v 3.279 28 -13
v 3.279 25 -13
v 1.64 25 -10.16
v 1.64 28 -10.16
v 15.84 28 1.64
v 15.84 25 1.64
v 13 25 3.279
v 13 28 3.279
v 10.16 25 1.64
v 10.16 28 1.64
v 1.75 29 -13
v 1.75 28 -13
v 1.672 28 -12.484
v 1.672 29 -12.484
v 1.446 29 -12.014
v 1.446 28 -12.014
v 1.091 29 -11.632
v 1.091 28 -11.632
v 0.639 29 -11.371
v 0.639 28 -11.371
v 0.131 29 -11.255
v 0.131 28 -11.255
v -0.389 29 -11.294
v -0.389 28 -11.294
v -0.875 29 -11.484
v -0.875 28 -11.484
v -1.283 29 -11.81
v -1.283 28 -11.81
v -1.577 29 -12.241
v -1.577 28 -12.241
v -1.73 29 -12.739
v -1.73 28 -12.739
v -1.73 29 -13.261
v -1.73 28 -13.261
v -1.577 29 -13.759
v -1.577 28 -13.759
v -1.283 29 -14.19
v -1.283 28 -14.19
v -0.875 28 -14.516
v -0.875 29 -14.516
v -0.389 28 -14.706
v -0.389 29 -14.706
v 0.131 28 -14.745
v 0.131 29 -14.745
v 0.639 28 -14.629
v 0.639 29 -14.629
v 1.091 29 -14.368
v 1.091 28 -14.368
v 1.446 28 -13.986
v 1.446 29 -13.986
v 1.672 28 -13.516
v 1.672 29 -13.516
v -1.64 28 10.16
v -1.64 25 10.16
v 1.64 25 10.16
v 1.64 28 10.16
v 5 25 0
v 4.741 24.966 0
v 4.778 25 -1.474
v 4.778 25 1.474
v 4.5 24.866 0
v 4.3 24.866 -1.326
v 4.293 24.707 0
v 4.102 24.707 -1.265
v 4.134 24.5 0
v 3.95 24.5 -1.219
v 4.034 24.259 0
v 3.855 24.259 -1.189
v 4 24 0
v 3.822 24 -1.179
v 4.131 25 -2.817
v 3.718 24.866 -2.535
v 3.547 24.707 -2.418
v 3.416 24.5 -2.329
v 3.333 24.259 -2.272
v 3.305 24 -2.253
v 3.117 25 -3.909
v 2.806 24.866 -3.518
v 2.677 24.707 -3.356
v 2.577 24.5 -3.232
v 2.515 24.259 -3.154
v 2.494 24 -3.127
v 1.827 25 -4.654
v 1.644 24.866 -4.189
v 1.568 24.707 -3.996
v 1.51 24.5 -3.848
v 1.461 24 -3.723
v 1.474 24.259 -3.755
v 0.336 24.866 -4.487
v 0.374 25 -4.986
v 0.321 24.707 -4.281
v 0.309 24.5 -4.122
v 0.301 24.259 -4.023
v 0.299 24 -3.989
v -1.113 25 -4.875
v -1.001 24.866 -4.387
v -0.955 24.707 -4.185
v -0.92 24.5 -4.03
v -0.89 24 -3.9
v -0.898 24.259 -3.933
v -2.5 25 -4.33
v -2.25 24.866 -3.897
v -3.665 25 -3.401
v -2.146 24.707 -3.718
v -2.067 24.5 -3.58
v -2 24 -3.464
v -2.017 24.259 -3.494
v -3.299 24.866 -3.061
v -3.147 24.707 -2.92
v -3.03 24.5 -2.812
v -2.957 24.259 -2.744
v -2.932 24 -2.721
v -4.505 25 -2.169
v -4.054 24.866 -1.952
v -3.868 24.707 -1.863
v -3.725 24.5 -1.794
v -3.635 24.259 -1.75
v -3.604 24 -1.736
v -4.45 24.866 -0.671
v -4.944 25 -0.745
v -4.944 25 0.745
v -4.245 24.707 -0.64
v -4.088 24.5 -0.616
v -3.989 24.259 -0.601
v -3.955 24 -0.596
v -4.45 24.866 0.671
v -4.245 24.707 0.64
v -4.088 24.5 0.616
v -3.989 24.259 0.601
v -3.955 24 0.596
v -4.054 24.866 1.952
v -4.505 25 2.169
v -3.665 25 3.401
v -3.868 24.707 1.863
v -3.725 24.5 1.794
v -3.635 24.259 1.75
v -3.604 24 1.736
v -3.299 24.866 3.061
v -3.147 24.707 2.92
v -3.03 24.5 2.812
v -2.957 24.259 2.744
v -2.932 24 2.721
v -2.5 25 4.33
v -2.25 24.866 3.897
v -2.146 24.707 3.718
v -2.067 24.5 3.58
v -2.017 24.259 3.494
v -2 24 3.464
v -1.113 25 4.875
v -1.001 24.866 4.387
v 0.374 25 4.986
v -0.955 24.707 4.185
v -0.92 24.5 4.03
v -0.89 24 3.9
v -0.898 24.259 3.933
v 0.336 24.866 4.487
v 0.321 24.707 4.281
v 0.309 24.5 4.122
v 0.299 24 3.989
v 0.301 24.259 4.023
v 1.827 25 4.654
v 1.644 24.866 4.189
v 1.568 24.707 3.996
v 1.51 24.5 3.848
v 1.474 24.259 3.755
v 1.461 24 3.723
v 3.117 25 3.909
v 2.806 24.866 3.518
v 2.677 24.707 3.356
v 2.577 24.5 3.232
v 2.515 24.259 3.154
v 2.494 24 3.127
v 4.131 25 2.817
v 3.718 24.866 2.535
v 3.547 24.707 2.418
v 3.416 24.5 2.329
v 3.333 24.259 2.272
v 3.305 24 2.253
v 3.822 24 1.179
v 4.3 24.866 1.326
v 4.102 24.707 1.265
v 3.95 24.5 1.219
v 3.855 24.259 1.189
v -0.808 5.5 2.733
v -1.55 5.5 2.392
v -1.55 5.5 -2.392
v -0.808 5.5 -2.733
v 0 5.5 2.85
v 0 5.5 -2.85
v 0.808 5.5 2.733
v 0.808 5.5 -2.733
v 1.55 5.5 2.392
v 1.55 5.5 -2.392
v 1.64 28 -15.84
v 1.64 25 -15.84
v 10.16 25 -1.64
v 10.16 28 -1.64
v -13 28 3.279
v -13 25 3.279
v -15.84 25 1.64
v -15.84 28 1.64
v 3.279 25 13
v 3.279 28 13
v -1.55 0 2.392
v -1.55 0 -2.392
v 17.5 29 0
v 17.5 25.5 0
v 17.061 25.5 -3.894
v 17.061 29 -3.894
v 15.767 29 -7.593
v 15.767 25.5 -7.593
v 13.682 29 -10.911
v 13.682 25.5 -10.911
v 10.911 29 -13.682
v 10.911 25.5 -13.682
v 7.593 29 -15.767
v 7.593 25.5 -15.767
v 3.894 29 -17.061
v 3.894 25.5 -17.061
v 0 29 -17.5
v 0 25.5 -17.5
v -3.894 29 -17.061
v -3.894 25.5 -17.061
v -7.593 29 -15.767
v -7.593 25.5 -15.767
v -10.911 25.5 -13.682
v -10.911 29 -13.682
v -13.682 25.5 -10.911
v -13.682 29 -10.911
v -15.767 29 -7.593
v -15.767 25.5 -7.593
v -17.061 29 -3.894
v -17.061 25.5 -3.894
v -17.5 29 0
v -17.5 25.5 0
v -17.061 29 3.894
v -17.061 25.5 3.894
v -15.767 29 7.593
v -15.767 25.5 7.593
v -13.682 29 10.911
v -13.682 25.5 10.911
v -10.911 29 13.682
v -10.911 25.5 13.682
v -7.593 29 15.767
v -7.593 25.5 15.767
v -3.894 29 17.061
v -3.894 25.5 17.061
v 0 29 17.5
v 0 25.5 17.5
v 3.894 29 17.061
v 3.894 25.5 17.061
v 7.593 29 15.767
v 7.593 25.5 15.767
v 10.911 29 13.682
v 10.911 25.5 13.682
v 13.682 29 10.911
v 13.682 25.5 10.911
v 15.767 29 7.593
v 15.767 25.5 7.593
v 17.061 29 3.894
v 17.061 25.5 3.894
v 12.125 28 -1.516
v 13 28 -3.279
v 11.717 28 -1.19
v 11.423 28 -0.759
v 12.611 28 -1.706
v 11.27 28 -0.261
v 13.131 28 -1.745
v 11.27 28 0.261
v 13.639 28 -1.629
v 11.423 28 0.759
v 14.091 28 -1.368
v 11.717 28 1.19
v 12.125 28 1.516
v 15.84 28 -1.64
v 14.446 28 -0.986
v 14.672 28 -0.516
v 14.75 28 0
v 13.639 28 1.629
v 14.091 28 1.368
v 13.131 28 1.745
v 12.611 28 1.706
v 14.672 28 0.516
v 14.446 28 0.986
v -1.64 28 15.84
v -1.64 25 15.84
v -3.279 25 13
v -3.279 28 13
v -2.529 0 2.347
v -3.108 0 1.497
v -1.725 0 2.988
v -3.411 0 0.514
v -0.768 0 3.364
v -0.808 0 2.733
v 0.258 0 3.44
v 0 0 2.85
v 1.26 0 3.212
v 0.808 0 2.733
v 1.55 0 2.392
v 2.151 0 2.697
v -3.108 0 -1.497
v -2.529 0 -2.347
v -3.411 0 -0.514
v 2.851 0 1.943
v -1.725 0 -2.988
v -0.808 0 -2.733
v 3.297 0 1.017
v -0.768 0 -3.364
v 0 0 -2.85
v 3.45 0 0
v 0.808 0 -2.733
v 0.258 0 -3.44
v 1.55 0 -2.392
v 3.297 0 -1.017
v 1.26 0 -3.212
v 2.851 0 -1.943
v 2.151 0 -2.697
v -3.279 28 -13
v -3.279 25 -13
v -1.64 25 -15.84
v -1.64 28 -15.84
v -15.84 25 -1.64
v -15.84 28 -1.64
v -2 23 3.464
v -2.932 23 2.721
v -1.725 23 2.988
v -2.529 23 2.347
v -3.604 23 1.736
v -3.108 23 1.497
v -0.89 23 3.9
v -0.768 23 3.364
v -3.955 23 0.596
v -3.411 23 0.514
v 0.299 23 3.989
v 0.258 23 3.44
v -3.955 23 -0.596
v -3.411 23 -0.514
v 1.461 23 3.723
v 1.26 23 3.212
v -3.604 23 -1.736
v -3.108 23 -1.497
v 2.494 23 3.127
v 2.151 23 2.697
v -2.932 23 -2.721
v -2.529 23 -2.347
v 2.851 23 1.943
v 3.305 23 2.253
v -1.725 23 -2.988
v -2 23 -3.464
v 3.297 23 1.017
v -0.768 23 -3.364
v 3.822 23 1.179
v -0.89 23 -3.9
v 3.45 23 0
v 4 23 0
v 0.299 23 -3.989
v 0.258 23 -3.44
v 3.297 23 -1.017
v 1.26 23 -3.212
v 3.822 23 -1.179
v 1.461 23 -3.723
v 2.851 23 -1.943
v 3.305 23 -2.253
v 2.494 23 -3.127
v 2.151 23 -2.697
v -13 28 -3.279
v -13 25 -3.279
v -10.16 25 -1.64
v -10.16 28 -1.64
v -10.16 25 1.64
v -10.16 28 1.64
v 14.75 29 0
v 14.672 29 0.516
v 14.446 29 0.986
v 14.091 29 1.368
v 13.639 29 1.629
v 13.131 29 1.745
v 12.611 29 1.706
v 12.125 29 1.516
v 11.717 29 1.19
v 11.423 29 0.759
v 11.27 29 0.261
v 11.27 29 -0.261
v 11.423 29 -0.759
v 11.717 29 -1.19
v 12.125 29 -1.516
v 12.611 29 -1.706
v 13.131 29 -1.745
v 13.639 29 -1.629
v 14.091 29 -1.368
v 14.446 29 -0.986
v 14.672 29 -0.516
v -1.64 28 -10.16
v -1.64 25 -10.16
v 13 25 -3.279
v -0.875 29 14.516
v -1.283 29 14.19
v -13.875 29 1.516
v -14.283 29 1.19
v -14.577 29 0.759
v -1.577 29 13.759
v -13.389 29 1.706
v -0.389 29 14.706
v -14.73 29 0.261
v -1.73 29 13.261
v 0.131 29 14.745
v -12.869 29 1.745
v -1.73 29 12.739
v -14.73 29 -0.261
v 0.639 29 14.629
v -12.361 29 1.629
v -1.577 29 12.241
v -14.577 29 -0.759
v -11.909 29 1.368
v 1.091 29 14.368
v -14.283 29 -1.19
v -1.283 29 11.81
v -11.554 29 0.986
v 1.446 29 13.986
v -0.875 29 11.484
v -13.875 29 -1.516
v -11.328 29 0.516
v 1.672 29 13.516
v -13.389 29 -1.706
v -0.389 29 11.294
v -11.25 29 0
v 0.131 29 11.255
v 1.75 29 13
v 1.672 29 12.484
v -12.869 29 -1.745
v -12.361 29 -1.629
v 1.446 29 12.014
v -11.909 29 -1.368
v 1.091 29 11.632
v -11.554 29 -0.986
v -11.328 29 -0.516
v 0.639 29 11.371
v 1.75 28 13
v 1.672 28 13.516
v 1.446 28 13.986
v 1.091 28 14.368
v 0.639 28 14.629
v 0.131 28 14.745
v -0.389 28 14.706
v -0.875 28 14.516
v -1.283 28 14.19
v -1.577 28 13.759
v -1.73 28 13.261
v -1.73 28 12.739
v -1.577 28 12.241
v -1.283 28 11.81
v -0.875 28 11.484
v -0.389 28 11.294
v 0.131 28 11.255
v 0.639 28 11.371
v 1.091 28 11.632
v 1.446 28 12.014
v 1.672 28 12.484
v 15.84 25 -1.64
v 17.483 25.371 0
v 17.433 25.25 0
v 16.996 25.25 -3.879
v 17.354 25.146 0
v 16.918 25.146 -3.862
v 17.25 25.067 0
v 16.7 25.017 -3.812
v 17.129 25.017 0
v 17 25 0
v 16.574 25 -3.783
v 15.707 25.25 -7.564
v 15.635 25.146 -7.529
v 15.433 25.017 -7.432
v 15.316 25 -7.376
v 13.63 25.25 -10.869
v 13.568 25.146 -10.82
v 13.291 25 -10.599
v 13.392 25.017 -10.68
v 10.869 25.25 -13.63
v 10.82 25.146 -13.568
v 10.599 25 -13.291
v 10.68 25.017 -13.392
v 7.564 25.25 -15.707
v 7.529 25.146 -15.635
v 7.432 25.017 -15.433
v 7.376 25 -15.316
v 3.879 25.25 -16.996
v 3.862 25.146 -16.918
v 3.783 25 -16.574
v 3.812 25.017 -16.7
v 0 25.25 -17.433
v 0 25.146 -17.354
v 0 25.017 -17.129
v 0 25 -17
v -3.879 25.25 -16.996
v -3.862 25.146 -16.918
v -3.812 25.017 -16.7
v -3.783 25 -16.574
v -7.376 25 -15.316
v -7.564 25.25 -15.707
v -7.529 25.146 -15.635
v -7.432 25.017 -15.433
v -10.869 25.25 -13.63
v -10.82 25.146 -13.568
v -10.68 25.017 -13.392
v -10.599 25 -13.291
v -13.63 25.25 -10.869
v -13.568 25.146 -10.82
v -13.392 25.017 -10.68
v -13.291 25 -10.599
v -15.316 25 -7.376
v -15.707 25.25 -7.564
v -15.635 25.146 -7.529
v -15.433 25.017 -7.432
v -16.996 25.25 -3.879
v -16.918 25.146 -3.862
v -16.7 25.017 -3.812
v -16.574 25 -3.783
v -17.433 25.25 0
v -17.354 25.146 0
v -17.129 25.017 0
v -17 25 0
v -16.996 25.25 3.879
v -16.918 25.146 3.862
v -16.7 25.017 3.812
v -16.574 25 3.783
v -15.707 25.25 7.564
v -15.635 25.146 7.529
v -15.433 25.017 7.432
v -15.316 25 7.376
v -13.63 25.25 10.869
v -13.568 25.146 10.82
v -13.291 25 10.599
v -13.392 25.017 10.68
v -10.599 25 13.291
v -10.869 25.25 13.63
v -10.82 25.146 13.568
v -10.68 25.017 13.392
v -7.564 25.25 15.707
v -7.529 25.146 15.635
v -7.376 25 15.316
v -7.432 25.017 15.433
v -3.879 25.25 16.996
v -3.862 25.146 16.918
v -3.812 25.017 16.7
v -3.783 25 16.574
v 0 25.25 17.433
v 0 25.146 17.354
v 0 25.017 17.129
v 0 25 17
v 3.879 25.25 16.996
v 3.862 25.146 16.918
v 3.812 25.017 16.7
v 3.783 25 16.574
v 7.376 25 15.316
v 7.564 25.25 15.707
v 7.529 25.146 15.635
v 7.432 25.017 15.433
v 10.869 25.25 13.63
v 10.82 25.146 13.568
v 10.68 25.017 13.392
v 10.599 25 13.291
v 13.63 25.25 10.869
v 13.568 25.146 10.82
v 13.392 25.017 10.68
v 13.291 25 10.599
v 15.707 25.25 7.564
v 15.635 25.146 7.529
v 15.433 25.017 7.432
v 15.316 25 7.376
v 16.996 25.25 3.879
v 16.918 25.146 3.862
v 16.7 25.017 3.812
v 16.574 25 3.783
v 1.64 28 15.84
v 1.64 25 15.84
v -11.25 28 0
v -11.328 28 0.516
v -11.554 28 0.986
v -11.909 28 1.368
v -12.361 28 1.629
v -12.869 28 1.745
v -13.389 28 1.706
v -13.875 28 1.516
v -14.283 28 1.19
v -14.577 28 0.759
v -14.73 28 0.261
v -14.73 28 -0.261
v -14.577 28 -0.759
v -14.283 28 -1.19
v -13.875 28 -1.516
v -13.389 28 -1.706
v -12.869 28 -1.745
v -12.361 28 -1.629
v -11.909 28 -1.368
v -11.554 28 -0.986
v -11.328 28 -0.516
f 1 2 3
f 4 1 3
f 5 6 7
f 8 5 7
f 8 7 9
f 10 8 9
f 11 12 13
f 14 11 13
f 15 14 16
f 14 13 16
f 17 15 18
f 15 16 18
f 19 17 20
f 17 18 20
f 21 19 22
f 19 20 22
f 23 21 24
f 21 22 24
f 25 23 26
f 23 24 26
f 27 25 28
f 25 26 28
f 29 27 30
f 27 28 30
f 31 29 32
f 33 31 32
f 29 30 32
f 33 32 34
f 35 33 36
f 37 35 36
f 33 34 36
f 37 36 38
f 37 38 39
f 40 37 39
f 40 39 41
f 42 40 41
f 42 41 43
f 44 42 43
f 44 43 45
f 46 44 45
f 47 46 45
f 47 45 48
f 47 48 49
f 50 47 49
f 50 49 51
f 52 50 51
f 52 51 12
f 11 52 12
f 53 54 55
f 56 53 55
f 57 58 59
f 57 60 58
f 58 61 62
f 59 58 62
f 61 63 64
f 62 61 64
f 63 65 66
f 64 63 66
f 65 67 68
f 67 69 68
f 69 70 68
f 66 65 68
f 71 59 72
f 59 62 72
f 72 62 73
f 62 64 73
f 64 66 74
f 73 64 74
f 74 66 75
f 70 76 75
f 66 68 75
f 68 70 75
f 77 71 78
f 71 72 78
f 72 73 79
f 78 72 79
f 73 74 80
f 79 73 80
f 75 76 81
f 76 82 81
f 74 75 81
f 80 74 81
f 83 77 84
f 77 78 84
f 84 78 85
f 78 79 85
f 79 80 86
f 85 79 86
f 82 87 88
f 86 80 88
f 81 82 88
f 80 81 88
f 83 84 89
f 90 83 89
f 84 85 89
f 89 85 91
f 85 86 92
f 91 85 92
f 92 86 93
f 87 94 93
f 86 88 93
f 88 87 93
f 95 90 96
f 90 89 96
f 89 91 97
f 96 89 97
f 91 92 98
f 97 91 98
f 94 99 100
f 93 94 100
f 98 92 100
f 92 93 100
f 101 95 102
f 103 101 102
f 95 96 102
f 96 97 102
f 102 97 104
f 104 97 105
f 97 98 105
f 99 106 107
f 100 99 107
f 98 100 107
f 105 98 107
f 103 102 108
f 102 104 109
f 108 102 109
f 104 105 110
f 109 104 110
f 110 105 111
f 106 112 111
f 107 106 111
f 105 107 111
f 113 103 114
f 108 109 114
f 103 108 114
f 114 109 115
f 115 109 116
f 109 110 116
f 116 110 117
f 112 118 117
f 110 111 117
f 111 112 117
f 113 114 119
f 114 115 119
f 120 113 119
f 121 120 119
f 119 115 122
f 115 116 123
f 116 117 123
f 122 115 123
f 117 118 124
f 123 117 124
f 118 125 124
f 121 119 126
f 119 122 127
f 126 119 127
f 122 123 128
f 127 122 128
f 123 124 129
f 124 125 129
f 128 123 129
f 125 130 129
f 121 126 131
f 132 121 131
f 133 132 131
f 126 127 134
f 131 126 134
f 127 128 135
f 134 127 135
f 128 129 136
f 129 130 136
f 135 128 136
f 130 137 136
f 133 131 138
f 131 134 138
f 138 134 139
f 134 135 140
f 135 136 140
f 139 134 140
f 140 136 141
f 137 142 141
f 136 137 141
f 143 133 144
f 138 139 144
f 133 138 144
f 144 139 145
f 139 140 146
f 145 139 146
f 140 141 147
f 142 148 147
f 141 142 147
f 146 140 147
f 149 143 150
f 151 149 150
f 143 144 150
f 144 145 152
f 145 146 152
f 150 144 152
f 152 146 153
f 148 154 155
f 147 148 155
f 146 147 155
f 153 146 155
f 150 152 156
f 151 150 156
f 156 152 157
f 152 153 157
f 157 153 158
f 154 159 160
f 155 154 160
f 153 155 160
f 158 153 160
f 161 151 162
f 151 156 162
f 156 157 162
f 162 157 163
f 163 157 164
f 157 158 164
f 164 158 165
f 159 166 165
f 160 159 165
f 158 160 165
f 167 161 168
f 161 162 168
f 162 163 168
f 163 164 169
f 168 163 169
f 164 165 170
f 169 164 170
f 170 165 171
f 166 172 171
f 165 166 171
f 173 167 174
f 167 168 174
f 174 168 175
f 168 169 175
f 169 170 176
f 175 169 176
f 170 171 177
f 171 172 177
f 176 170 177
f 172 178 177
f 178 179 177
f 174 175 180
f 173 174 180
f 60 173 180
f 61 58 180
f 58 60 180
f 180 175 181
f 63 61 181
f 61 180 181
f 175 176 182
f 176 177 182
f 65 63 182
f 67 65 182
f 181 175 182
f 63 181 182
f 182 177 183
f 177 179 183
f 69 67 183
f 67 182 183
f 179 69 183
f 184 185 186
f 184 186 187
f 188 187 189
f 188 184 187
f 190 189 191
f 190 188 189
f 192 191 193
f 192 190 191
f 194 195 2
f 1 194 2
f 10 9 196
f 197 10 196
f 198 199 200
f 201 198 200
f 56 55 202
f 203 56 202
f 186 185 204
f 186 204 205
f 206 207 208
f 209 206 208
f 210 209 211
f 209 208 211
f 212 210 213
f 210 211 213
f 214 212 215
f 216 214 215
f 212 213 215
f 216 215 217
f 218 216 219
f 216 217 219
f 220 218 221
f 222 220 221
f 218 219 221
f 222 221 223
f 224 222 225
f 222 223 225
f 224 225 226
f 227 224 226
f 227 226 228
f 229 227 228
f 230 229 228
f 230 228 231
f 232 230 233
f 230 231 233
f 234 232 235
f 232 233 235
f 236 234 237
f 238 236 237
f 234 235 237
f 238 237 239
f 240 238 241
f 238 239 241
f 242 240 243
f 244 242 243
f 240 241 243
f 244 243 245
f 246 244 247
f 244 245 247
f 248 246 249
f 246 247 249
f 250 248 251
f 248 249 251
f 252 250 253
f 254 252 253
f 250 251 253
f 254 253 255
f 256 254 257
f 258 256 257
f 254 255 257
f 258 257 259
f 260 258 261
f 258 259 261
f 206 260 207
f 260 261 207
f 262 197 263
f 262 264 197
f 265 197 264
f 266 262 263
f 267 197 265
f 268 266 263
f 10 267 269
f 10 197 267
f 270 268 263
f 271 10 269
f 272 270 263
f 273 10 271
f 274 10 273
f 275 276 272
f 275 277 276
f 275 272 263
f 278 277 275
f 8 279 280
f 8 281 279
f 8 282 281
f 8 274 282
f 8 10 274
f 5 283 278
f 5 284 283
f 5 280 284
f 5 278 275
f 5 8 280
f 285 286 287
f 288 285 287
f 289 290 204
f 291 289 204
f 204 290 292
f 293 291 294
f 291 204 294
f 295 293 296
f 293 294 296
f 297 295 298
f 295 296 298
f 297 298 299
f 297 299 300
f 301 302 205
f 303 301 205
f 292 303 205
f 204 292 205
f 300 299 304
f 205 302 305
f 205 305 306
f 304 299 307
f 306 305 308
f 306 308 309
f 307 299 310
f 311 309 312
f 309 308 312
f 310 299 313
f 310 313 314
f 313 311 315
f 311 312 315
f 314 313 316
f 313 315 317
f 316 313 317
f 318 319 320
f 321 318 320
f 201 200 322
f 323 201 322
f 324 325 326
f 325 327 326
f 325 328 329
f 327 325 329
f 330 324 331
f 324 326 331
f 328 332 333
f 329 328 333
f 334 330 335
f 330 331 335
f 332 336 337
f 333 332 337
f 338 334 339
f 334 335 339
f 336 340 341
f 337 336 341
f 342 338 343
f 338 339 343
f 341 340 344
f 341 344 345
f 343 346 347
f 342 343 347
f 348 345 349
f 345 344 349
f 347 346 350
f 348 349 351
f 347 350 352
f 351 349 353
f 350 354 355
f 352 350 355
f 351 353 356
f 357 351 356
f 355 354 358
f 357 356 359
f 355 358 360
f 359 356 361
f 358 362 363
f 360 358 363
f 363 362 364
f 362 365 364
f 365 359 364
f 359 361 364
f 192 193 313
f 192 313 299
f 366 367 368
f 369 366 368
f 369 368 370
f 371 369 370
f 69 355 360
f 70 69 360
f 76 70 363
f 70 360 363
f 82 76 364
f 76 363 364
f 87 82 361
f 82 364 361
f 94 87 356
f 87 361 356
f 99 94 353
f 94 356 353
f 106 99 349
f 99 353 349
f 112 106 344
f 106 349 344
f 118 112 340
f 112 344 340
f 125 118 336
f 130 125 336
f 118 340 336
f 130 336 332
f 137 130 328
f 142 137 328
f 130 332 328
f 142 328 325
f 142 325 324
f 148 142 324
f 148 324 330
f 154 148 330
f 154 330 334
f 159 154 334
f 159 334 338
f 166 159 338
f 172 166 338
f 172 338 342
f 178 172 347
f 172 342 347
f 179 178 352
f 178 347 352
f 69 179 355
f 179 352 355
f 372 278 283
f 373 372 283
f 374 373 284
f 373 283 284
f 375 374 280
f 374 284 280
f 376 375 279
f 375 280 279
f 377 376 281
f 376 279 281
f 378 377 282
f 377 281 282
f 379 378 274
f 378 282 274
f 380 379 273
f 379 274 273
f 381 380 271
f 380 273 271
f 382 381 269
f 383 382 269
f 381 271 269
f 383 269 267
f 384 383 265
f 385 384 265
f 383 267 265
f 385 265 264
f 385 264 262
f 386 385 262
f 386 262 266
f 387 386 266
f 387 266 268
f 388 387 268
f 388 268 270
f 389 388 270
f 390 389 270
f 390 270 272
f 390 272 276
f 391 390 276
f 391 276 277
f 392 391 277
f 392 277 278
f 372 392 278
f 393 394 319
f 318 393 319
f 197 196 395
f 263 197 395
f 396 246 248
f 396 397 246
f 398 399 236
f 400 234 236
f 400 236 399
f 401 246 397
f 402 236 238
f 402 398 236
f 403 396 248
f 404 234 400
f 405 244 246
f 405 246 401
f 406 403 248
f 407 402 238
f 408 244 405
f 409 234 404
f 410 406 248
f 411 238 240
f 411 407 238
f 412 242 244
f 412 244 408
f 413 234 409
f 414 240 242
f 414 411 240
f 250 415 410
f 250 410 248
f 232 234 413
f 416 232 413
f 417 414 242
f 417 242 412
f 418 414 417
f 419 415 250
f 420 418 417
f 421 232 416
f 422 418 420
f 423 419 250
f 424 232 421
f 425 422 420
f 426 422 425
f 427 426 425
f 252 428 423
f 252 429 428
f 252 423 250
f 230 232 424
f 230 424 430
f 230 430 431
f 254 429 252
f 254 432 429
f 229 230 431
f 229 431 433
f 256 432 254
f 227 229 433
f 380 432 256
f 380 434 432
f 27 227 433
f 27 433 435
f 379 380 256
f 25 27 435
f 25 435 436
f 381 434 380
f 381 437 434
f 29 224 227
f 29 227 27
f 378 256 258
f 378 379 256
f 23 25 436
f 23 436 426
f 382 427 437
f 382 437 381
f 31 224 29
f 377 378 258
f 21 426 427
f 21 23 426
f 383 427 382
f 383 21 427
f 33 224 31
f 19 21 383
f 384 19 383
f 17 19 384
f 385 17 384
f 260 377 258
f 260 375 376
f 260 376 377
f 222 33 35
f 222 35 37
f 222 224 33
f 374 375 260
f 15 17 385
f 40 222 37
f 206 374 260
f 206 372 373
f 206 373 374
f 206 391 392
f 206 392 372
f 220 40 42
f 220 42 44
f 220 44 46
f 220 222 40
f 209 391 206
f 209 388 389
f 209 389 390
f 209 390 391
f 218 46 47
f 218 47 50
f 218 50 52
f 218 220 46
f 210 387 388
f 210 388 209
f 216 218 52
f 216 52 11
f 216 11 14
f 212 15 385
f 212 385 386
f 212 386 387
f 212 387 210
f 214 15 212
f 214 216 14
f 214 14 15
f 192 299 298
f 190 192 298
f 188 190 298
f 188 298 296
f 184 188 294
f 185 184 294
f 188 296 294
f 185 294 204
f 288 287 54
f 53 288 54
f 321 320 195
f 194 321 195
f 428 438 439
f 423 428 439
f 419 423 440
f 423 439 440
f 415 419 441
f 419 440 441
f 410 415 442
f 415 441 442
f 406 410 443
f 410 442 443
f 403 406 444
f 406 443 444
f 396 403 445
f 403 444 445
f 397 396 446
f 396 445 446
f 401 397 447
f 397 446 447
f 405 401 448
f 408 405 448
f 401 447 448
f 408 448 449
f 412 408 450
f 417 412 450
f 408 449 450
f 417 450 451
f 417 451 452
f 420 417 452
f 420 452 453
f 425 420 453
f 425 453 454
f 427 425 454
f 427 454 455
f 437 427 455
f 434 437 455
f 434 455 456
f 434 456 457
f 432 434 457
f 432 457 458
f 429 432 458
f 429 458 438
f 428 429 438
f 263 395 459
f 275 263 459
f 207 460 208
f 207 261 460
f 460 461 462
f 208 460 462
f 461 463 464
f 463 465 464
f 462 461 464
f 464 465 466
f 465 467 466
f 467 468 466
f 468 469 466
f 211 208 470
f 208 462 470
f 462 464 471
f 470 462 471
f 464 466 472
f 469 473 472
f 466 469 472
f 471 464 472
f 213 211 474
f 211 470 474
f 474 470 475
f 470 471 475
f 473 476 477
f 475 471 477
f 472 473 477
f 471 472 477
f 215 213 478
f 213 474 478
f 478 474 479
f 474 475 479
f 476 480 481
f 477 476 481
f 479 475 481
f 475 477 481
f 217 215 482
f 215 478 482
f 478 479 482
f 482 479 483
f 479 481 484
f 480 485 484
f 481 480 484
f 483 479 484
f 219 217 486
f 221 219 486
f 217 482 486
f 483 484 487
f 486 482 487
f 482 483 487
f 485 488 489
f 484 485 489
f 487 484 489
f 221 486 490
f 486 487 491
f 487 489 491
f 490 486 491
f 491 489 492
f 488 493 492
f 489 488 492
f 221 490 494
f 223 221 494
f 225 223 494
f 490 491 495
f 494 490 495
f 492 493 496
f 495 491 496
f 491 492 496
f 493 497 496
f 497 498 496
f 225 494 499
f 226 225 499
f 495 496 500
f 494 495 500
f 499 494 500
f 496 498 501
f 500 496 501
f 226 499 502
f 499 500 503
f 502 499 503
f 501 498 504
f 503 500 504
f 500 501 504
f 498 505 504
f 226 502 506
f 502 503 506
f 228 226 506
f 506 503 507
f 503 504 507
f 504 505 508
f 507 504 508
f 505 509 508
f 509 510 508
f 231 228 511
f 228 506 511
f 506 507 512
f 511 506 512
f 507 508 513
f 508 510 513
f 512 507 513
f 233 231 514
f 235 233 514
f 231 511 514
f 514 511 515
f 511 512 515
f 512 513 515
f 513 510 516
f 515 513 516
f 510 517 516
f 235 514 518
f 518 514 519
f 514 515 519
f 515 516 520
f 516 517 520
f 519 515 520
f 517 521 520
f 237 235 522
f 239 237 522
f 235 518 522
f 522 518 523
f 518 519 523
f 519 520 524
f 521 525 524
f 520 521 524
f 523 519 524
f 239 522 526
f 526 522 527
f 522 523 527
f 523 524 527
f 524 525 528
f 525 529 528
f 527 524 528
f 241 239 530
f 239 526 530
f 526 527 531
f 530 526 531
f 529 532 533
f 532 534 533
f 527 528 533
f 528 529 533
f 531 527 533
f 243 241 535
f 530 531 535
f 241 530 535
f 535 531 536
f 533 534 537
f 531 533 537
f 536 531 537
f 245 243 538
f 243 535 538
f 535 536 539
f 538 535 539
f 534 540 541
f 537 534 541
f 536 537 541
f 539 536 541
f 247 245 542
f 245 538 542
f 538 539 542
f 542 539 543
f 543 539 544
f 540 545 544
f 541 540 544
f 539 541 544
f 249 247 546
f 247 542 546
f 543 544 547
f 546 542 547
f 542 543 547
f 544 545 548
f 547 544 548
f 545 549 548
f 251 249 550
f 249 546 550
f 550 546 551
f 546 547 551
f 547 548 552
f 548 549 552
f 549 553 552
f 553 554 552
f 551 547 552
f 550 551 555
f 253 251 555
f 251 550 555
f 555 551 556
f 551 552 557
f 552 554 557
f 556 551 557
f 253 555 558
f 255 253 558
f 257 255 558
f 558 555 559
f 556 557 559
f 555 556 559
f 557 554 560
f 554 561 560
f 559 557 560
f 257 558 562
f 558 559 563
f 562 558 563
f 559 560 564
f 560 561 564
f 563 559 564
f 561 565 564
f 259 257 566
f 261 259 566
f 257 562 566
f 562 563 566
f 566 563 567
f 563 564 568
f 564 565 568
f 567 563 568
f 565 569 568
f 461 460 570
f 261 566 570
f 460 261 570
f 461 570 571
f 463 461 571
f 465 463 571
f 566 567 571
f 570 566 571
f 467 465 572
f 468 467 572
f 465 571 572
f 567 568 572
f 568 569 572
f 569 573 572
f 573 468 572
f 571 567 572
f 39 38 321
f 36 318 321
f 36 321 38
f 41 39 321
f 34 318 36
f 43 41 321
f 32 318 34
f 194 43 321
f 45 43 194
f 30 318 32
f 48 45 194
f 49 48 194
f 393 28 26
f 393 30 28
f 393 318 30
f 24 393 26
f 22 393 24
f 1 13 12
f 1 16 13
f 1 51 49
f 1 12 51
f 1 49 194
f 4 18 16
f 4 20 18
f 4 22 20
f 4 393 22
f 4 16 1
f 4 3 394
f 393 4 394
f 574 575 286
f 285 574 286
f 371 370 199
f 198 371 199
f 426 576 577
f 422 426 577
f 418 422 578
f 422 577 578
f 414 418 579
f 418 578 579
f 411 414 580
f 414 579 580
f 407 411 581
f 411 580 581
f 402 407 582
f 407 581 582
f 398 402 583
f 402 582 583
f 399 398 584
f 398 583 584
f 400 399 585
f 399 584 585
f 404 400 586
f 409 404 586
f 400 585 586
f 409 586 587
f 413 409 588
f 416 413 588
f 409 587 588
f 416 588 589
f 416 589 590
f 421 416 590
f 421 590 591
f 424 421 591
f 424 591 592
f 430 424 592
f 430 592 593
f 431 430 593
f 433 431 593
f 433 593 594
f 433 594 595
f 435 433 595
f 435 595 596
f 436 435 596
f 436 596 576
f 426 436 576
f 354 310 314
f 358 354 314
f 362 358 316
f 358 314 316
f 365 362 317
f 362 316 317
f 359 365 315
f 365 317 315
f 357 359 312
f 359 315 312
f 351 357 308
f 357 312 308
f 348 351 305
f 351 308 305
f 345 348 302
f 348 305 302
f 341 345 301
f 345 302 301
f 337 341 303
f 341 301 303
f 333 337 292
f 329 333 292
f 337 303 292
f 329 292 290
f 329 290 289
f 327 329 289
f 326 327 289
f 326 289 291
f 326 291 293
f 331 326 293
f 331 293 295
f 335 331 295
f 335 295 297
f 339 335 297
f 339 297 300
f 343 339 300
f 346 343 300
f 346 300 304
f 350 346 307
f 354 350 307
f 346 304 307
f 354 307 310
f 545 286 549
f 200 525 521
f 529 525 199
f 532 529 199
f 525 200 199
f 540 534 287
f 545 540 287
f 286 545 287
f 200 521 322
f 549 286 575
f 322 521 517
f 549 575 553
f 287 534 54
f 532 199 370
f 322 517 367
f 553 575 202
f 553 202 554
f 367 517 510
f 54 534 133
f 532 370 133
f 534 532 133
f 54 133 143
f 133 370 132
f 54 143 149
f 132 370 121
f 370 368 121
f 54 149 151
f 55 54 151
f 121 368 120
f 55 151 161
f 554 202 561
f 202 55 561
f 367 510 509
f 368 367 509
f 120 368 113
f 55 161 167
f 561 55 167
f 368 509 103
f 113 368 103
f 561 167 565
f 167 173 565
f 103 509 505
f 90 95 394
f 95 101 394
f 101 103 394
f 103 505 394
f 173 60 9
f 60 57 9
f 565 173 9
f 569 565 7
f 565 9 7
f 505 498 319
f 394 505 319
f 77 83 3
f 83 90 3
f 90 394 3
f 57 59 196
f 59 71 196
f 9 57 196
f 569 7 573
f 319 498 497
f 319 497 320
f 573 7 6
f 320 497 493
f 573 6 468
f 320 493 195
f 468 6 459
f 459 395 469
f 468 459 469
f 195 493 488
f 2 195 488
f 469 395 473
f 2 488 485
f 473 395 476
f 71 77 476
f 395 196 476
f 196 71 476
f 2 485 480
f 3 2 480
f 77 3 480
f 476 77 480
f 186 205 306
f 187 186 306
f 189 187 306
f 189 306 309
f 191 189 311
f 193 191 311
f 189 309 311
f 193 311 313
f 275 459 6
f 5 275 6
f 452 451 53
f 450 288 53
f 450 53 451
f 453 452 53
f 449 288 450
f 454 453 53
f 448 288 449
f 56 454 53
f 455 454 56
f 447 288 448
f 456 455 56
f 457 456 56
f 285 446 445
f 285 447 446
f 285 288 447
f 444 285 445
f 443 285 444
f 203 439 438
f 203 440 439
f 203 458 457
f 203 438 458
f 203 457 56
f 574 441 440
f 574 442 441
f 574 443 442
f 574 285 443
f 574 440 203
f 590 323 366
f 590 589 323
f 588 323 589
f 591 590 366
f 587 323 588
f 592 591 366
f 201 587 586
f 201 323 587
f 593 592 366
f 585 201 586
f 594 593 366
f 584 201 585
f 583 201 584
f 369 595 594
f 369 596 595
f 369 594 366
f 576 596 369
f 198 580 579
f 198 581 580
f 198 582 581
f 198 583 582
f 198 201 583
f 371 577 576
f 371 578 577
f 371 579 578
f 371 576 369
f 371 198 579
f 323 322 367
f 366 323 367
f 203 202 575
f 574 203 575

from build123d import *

# Parameters (mm, degrees)
SKETCH_1_R          = 3.45
EXTRUDE_1_DEPTH     = 23
CUT_EXTRUDE_1_DEPTH = 5.5
SKETCH_3_R          = 4
EXTRUDE_2_DEPTH     = 2
SKETCH_4_R          = 17.5
EXTRUDE_3_DEPTH     = 4
CUT_EXTRUDE_2_DEPTH = 3
SKETCH_6_R          = 1.75
CUT_EXTRUDE_3_DEPTH = 2
FILLET_1_R          = 0.5
FILLET_2_R          = 1


with BuildPart() as part:
    # Эскиз1 → Бобышка-Вытянуть1 (new body)
    with BuildSketch(Plane(origin=(0, 0, 0), x_dir=(1, 0, 0), z_dir=(0, 1, 0))):
        Circle(SKETCH_1_R)
    extrude(amount=EXTRUDE_1_DEPTH)

    # Эскиз2 → Вырез-Вытянуть1 (cut)
    with BuildSketch(Plane.XZ):
        with BuildLine():
            Line((-1.55, 2.391652149), (-1.55, -2.391652149))
            ThreePointArc((-1.55, -2.391652149), (0, -2.85), (1.55, -2.391652149))
            Line((1.55, -2.391652149), (1.55, 2.391652149))
            ThreePointArc((1.55, 2.391652149), (0, 2.85), (-1.55, 2.391652149))
        make_face()
    extrude(amount=-CUT_EXTRUDE_1_DEPTH, mode=Mode.SUBTRACT)

    # Эскиз3 → Бобышка-Вытянуть2 (add)
    with BuildSketch(Plane(origin=(0, 23, 0), x_dir=(1, 0, 0), z_dir=(0, 1, 0))):
        Circle(SKETCH_3_R)
    extrude(amount=EXTRUDE_2_DEPTH)

    # Эскиз4 → Бобышка-Вытянуть3 (add)
    with BuildSketch(Plane(origin=(0, 25, 0), x_dir=(1, 0, 0), z_dir=(0, 1, 0))):
        Circle(SKETCH_4_R)
    extrude(amount=EXTRUDE_3_DEPTH)

    # Эскиз5 → Вырез-Вытянуть2 (cut)
    with BuildSketch(Plane.XZ.offset(-25)):
        Polygon((13, -3.279349529), (15.84, -1.639674764), (15.84, 1.639674764), (13, 3.279349529), (10.16, 1.639674764), (10.16, -1.639674764), align=None)
        Polygon((3.279349529, 13), (1.639674764, 15.84), (-1.639674764, 15.84), (-3.279349529, 13), (-1.639674764, 10.16), (1.639674764, 10.16), align=None)
        Polygon((-3.279349529, -13), (-1.639674764, -15.84), (1.639674764, -15.84), (3.279349529, -13), (1.639674764, -10.16), (-1.639674764, -10.16), align=None)
        Polygon((-13, 3.279349529), (-15.84, 1.639674764), (-15.84, -1.639674764), (-13, -3.279349529), (-10.16, -1.639674764), (-10.16, 1.639674764), align=None)
    extrude(amount=-CUT_EXTRUDE_2_DEPTH, mode=Mode.SUBTRACT)

    # Эскиз6 → Вырез-Вытянуть3 (cut, through all)
    with BuildSketch(Plane.XZ.offset(-28)):
        with Locations((0, 13)):
            Circle(SKETCH_6_R)
        with Locations((13, 0)):
            Circle(SKETCH_6_R)
        with Locations((0, -13)):
            Circle(SKETCH_6_R)
        with Locations((-13, 0)):
            Circle(SKETCH_6_R)
    extrude(amount=-CUT_EXTRUDE_3_DEPTH, mode=Mode.SUBTRACT)

    # Скругление1
    fillet_1_edges = [part.edges().sort_by_distance(p)[0] for p in [
        (-17.5, 25, 0),
    ]]
    fillet(fillet_1_edges, radius=FILLET_1_R)

    # Скругление2
    fillet_2_edges = [part.edges().sort_by_distance(p)[0] for p in [
        (-4, 25, 0),
    ]]
    fillet(fillet_2_edges, radius=FILLET_2_R)


solid = part.part
